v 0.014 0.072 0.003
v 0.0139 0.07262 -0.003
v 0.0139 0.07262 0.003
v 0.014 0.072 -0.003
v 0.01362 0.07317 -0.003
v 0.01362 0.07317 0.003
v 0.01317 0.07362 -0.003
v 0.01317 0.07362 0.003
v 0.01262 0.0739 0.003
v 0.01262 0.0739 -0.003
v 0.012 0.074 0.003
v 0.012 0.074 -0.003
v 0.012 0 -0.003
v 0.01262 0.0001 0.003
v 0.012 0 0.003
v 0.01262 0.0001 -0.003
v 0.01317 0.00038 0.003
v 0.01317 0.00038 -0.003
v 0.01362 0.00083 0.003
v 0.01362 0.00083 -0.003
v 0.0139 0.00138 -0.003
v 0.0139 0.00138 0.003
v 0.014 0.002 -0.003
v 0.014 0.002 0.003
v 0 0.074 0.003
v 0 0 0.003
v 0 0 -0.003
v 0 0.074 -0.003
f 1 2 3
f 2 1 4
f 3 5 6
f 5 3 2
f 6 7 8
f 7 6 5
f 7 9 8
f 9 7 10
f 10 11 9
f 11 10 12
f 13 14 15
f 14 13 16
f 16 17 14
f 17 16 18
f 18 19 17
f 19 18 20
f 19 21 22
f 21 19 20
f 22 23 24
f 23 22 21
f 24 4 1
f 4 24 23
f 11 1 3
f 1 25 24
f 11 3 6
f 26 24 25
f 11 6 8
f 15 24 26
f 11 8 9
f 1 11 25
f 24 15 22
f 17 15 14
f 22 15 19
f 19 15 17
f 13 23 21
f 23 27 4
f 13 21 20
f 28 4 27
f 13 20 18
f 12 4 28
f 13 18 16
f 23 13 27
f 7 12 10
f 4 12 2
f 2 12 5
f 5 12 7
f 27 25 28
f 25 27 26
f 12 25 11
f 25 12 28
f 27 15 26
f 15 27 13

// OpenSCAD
// file: ../lib/round_cut.scad
module round_cut(radius, height)
{
    translate([0,0,-height*0.05])
    difference()
    {
        cube(size=[radius*1.1,
                   radius*1.1,
                   height*1.1],
             center=false);
        cylinder(h=height*1.1,
                 r=radius,
                 center=false);
    }
}
// file: ../lib/tab.scad
use <round_cut.scad>
module tab()
{
    translate([0,0,-tab_thick/2])
    difference()
    {
        cube(size=[tab_height,
                   tab_width,
                   tab_thick],
             center=false);

        translate([tab_height-tab_round,
                   tab_width -tab_round,
                   0])
        round_cut(tab_round, tab_thick);

        translate([tab_height-tab_round,
                   tab_round,
                   0])
        rotate([0,0,-90])
        round_cut(tab_round, tab_thick);
    }
}
// main file
// Dimensions in m (SI)
tab_height = 0.014;
tab_width  = 0.074;
tab_thick  = 0.006;
tab_round  = 0.002;

// face resolution for curved surfaces
$fn=20;

include <../lib/tab.scad>
// first tab
tab();
